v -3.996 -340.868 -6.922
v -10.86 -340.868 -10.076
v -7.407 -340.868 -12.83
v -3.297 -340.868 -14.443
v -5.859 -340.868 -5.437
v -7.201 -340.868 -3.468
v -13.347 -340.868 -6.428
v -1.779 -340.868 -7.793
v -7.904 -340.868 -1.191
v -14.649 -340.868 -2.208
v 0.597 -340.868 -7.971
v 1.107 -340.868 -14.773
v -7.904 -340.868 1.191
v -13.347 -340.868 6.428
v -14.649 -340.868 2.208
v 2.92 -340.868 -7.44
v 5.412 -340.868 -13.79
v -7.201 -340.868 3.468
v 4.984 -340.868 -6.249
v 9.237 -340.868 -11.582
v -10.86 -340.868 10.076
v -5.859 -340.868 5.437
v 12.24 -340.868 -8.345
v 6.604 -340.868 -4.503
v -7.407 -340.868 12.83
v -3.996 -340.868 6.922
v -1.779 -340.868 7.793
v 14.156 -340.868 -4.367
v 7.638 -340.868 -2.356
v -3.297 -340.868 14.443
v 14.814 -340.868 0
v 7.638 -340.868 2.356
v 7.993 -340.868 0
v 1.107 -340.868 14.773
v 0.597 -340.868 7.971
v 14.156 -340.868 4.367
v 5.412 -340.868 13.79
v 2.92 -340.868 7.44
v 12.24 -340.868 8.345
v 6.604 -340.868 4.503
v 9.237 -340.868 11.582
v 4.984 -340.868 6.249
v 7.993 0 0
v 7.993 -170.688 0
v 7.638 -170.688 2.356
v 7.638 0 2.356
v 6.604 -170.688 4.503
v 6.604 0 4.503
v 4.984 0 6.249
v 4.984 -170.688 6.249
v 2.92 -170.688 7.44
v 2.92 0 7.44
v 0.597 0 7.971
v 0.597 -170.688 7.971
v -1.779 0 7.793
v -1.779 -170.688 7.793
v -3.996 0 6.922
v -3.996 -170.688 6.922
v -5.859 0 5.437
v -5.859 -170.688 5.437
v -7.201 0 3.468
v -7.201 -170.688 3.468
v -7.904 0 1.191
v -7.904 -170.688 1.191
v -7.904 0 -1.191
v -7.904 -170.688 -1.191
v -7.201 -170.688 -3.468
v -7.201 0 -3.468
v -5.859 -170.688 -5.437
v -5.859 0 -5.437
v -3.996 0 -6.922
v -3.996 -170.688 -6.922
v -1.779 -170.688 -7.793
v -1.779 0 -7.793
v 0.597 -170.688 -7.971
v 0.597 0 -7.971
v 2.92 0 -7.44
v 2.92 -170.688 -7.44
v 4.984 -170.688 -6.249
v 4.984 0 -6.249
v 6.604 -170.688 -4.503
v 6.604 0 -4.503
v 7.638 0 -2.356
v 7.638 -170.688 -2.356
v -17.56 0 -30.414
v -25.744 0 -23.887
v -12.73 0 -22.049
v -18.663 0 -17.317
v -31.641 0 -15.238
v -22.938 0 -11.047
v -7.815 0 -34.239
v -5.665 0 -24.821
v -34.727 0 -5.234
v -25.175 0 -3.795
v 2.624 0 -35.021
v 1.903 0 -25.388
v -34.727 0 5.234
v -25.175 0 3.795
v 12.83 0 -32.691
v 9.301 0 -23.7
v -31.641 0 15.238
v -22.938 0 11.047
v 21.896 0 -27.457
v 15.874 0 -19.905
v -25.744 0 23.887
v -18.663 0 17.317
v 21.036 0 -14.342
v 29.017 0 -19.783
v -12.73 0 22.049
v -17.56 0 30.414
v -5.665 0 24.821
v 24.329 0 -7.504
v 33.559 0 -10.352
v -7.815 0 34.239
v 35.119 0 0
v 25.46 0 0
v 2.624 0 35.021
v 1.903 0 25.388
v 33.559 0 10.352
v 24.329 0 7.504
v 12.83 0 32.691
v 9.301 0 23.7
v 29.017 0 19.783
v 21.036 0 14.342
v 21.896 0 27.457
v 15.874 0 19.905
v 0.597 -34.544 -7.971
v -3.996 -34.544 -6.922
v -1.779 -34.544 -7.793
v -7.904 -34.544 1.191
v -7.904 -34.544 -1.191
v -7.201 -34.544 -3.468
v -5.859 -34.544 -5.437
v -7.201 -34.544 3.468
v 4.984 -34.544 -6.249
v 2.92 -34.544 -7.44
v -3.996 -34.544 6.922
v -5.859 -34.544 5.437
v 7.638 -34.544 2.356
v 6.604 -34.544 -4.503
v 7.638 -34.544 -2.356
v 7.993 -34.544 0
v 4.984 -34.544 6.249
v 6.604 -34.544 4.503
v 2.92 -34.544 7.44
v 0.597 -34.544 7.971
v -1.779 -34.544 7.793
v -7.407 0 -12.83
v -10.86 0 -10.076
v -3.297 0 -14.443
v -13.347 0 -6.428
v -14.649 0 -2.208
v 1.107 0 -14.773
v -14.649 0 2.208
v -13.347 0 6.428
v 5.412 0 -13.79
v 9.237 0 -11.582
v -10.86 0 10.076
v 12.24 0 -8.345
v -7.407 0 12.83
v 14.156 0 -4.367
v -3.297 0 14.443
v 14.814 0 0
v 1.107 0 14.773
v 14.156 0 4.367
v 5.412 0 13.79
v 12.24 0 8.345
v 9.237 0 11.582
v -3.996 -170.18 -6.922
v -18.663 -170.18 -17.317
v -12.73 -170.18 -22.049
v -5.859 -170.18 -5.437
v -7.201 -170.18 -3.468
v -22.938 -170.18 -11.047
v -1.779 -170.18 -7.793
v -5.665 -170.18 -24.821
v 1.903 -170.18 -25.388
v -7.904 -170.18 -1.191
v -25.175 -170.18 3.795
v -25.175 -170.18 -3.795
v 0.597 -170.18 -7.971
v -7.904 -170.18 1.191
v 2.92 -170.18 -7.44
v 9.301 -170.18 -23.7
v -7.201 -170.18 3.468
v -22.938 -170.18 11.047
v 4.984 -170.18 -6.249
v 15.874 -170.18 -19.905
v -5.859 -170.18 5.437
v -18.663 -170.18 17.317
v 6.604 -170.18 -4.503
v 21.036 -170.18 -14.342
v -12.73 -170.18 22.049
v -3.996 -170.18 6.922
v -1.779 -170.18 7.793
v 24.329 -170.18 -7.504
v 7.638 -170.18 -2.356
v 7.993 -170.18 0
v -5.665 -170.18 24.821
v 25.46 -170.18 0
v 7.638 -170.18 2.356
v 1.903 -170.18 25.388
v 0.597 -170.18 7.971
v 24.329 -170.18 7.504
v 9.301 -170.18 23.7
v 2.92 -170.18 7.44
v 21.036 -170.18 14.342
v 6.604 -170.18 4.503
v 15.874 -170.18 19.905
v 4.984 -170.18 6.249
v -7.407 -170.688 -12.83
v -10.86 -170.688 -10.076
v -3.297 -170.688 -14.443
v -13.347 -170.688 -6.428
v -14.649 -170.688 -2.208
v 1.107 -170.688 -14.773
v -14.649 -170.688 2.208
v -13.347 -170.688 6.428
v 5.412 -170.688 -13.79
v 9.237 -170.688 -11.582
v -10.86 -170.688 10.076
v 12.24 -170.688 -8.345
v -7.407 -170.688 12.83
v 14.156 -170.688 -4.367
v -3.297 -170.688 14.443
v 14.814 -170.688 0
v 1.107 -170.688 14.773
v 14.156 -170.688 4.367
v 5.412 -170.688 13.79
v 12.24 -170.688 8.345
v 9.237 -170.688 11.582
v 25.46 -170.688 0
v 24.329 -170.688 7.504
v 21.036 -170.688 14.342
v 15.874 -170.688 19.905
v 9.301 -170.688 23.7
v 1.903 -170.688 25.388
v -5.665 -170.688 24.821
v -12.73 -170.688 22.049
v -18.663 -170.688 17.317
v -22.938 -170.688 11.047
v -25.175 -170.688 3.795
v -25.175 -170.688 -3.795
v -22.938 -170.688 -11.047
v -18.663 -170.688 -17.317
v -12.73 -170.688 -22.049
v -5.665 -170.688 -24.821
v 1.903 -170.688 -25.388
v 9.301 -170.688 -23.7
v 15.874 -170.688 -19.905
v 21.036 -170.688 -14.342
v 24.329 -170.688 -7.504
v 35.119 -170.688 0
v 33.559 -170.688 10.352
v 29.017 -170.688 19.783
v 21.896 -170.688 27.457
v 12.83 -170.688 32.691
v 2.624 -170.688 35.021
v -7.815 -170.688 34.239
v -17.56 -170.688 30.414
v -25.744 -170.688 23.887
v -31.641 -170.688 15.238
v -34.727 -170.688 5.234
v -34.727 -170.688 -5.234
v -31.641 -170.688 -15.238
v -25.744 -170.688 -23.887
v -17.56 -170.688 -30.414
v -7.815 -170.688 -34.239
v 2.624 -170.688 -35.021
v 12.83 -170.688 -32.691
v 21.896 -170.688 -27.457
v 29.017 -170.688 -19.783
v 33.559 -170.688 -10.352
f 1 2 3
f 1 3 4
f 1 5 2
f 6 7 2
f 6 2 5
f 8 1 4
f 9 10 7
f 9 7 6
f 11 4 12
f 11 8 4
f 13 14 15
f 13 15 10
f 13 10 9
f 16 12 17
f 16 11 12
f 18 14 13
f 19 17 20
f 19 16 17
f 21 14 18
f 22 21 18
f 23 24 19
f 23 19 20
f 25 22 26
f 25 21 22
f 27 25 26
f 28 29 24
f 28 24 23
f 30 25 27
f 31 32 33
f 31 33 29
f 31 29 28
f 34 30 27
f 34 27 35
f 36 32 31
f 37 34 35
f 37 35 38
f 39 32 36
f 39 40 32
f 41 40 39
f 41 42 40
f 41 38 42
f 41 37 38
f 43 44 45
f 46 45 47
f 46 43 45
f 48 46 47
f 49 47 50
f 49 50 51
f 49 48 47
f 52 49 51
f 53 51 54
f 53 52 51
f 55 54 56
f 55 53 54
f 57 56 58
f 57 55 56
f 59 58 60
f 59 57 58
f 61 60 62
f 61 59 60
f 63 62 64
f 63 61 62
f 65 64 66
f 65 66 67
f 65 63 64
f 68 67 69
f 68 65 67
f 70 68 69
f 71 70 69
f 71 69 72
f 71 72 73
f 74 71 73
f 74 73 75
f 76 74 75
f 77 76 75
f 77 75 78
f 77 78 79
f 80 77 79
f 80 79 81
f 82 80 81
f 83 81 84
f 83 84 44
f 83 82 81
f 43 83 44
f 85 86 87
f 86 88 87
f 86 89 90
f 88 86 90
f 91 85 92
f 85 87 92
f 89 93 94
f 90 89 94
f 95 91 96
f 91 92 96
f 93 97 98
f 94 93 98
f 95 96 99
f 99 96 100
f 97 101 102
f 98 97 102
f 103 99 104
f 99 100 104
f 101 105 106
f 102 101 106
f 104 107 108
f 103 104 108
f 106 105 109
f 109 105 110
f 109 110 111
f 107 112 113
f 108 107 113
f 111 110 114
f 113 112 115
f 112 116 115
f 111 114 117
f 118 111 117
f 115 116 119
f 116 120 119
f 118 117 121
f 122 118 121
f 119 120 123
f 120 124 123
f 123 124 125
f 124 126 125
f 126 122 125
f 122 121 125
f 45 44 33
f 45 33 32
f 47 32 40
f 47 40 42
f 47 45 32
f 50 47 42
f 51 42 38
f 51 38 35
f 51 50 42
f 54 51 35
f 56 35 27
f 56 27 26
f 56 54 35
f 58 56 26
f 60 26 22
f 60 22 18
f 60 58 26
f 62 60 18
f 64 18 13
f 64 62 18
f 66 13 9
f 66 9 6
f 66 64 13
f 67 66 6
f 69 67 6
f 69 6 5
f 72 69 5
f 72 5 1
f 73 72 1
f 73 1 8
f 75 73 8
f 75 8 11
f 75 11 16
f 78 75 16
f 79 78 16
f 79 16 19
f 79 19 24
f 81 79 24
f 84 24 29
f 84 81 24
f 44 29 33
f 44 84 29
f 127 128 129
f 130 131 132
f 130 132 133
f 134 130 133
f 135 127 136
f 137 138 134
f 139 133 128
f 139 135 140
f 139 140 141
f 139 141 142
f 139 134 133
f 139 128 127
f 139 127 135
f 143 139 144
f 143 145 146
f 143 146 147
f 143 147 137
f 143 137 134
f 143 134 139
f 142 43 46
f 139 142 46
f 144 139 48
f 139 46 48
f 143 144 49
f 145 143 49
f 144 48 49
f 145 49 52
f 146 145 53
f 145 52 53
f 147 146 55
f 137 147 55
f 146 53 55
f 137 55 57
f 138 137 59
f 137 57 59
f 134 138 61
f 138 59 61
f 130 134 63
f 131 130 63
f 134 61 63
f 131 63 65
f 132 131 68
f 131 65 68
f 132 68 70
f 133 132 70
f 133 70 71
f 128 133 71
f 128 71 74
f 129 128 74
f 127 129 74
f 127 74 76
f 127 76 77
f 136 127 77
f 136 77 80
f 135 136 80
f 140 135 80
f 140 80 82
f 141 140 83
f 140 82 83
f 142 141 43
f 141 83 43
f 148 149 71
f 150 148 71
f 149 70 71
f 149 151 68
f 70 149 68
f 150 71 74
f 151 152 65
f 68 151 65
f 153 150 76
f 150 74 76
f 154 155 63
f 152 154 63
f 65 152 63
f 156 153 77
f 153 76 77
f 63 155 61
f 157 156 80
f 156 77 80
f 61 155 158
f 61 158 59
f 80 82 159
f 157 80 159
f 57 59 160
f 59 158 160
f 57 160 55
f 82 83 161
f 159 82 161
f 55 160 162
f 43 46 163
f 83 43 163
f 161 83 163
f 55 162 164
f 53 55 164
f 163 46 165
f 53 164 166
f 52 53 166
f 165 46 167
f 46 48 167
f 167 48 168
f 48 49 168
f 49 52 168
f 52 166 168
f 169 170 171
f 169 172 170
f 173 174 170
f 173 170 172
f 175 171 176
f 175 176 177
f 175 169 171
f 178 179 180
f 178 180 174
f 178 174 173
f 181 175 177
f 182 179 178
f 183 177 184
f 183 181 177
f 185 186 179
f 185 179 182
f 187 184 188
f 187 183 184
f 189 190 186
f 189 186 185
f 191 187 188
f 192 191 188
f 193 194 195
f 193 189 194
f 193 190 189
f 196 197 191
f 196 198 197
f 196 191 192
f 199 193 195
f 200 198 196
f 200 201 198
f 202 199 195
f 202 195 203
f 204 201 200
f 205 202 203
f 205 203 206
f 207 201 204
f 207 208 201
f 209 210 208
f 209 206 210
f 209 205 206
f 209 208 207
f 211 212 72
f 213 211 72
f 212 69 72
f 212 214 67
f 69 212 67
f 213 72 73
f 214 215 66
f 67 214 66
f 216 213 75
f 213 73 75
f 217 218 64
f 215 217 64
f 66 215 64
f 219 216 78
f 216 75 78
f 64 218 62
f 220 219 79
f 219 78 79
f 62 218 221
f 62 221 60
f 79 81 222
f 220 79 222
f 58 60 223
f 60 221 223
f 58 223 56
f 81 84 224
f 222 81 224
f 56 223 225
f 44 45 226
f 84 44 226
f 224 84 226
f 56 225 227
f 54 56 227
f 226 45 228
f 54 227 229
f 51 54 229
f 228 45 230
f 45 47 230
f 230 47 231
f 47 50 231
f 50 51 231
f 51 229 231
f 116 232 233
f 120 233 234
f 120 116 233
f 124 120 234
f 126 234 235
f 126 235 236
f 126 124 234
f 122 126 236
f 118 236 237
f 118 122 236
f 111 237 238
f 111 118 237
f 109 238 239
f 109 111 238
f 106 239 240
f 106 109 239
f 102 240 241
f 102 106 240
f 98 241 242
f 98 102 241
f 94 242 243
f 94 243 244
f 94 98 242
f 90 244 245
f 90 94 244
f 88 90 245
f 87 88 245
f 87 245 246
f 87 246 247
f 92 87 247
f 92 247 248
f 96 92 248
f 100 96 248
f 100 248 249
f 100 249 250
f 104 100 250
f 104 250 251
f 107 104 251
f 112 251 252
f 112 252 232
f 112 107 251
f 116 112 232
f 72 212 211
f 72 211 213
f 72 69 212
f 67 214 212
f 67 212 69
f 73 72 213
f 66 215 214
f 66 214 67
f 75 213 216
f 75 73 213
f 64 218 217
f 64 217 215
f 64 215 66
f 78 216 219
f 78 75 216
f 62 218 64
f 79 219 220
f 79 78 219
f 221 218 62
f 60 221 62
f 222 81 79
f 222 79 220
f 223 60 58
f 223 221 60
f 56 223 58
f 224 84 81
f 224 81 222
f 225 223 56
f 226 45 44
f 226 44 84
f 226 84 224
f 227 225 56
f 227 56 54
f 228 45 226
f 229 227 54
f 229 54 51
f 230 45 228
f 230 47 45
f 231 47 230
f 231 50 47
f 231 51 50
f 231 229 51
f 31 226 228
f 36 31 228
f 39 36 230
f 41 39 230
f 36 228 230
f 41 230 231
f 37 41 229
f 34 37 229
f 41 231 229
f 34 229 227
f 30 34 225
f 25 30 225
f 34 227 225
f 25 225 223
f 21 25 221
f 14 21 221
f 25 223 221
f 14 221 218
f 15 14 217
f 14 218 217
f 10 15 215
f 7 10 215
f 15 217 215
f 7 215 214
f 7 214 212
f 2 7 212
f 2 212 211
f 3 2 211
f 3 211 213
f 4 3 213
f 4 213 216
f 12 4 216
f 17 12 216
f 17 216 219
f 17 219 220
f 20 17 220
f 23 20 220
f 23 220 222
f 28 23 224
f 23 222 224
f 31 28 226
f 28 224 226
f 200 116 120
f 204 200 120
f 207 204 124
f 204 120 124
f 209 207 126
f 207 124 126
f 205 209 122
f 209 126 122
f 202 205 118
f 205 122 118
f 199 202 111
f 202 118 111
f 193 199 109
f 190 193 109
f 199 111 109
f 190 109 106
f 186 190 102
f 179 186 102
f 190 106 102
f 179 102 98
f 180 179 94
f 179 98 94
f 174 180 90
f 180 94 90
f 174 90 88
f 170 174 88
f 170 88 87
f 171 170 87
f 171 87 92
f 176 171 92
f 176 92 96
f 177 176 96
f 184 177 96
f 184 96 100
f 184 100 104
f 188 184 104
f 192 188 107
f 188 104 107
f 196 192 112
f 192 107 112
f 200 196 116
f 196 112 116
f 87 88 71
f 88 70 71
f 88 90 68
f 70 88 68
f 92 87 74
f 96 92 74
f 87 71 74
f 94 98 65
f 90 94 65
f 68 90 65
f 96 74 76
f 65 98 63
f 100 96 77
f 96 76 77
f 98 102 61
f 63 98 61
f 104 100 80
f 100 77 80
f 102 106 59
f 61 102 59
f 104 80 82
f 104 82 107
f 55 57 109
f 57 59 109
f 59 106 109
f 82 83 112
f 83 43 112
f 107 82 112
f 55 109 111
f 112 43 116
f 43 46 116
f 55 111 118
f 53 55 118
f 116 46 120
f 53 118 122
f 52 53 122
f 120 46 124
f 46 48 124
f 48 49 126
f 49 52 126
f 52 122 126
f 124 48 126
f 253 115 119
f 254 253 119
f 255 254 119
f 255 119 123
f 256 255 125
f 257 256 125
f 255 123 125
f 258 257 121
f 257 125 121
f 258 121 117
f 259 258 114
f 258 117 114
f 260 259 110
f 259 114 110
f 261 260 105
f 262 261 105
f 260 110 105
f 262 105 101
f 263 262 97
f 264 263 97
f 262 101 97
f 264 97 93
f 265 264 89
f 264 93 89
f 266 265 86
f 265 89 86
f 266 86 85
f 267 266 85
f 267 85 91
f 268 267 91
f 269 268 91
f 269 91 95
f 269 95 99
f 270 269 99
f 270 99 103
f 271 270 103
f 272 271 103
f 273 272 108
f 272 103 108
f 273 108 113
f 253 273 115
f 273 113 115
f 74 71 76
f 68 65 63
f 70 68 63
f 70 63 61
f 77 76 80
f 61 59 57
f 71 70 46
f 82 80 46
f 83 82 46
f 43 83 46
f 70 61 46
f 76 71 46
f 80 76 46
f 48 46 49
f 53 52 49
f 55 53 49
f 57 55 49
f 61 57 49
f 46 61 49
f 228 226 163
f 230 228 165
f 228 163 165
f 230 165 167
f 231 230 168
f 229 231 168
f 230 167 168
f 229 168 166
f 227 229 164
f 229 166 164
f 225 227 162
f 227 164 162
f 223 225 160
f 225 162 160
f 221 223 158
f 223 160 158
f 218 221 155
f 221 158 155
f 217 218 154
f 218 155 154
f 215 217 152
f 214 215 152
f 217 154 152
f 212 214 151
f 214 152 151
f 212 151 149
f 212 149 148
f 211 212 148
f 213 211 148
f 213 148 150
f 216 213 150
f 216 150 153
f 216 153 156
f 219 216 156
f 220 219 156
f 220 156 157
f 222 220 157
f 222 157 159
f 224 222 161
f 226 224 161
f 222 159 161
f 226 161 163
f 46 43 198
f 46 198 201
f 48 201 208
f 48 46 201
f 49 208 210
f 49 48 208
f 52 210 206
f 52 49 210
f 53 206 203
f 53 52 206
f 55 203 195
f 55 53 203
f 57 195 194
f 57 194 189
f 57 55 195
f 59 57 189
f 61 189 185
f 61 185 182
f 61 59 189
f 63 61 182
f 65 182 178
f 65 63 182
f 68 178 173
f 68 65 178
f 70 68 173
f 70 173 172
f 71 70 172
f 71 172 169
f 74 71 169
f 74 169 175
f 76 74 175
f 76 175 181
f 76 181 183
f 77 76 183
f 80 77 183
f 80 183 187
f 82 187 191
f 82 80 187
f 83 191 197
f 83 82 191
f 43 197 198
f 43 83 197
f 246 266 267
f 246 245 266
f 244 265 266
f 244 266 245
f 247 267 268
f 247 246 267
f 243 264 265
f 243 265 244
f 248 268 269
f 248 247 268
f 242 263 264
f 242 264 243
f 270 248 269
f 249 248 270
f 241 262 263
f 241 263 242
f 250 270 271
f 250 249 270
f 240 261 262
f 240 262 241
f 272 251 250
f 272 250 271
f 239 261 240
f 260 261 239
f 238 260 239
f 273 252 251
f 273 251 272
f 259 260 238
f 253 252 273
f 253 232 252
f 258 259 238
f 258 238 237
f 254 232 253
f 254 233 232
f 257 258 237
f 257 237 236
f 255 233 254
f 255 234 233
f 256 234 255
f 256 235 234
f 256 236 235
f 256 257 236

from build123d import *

# Parameters (mm, degrees)
F0_R        = 35.1191473408
F0_R_2      = 25.4596723579
F2_DEPTH    = 170.688
F1_R        = 14.8144691806
F1_R_2      = 7.992932925
F1_R_3      = 25.4596723579
F2_FACE_R   = 14.8144691806
F2_FACE_R_2 = 7.992932925
F3_DEPTH    = 170.18
F4_DEPTH    = 34.544


with BuildPart() as f2:
    # F0 (on Front) → F2 (new body)
    with BuildSketch(Plane.XZ):
        Circle(F0_R)
        Circle(F0_R_2, mode=Mode.SUBTRACT)
    extrude(amount=F2_DEPTH)


with BuildPart() as f2b:
    # F1 (on face) → F2, piece 2 (new body)
    with BuildSketch(Plane.XZ):
        Circle(F1_R)
        Circle(F1_R_2, mode=Mode.SUBTRACT)
    extrude(amount=F2_DEPTH)


with BuildPart() as f3:
    # F1 (on face) + F2_face (on face) → F3 (new body)
    with BuildSketch(Plane.XZ):
        Circle(F1_R_3)
        Circle(F1_R, mode=Mode.SUBTRACT)
        Circle(F1_R)
        Circle(F1_R_2, mode=Mode.SUBTRACT)
    with BuildSketch(Plane.XZ.offset(170.688)):
        Circle(F2_FACE_R)
        Circle(F2_FACE_R_2, mode=Mode.SUBTRACT)
    extrude(amount=F3_DEPTH)


with BuildPart() as f4:
    # F1 (on face) → F4 (new body)
    with BuildSketch(Plane.XZ):
        Circle(F1_R_2)
    extrude(amount=F4_DEPTH)


solid = Compound([f2.part, f2b.part, f3.part, f4.part])
